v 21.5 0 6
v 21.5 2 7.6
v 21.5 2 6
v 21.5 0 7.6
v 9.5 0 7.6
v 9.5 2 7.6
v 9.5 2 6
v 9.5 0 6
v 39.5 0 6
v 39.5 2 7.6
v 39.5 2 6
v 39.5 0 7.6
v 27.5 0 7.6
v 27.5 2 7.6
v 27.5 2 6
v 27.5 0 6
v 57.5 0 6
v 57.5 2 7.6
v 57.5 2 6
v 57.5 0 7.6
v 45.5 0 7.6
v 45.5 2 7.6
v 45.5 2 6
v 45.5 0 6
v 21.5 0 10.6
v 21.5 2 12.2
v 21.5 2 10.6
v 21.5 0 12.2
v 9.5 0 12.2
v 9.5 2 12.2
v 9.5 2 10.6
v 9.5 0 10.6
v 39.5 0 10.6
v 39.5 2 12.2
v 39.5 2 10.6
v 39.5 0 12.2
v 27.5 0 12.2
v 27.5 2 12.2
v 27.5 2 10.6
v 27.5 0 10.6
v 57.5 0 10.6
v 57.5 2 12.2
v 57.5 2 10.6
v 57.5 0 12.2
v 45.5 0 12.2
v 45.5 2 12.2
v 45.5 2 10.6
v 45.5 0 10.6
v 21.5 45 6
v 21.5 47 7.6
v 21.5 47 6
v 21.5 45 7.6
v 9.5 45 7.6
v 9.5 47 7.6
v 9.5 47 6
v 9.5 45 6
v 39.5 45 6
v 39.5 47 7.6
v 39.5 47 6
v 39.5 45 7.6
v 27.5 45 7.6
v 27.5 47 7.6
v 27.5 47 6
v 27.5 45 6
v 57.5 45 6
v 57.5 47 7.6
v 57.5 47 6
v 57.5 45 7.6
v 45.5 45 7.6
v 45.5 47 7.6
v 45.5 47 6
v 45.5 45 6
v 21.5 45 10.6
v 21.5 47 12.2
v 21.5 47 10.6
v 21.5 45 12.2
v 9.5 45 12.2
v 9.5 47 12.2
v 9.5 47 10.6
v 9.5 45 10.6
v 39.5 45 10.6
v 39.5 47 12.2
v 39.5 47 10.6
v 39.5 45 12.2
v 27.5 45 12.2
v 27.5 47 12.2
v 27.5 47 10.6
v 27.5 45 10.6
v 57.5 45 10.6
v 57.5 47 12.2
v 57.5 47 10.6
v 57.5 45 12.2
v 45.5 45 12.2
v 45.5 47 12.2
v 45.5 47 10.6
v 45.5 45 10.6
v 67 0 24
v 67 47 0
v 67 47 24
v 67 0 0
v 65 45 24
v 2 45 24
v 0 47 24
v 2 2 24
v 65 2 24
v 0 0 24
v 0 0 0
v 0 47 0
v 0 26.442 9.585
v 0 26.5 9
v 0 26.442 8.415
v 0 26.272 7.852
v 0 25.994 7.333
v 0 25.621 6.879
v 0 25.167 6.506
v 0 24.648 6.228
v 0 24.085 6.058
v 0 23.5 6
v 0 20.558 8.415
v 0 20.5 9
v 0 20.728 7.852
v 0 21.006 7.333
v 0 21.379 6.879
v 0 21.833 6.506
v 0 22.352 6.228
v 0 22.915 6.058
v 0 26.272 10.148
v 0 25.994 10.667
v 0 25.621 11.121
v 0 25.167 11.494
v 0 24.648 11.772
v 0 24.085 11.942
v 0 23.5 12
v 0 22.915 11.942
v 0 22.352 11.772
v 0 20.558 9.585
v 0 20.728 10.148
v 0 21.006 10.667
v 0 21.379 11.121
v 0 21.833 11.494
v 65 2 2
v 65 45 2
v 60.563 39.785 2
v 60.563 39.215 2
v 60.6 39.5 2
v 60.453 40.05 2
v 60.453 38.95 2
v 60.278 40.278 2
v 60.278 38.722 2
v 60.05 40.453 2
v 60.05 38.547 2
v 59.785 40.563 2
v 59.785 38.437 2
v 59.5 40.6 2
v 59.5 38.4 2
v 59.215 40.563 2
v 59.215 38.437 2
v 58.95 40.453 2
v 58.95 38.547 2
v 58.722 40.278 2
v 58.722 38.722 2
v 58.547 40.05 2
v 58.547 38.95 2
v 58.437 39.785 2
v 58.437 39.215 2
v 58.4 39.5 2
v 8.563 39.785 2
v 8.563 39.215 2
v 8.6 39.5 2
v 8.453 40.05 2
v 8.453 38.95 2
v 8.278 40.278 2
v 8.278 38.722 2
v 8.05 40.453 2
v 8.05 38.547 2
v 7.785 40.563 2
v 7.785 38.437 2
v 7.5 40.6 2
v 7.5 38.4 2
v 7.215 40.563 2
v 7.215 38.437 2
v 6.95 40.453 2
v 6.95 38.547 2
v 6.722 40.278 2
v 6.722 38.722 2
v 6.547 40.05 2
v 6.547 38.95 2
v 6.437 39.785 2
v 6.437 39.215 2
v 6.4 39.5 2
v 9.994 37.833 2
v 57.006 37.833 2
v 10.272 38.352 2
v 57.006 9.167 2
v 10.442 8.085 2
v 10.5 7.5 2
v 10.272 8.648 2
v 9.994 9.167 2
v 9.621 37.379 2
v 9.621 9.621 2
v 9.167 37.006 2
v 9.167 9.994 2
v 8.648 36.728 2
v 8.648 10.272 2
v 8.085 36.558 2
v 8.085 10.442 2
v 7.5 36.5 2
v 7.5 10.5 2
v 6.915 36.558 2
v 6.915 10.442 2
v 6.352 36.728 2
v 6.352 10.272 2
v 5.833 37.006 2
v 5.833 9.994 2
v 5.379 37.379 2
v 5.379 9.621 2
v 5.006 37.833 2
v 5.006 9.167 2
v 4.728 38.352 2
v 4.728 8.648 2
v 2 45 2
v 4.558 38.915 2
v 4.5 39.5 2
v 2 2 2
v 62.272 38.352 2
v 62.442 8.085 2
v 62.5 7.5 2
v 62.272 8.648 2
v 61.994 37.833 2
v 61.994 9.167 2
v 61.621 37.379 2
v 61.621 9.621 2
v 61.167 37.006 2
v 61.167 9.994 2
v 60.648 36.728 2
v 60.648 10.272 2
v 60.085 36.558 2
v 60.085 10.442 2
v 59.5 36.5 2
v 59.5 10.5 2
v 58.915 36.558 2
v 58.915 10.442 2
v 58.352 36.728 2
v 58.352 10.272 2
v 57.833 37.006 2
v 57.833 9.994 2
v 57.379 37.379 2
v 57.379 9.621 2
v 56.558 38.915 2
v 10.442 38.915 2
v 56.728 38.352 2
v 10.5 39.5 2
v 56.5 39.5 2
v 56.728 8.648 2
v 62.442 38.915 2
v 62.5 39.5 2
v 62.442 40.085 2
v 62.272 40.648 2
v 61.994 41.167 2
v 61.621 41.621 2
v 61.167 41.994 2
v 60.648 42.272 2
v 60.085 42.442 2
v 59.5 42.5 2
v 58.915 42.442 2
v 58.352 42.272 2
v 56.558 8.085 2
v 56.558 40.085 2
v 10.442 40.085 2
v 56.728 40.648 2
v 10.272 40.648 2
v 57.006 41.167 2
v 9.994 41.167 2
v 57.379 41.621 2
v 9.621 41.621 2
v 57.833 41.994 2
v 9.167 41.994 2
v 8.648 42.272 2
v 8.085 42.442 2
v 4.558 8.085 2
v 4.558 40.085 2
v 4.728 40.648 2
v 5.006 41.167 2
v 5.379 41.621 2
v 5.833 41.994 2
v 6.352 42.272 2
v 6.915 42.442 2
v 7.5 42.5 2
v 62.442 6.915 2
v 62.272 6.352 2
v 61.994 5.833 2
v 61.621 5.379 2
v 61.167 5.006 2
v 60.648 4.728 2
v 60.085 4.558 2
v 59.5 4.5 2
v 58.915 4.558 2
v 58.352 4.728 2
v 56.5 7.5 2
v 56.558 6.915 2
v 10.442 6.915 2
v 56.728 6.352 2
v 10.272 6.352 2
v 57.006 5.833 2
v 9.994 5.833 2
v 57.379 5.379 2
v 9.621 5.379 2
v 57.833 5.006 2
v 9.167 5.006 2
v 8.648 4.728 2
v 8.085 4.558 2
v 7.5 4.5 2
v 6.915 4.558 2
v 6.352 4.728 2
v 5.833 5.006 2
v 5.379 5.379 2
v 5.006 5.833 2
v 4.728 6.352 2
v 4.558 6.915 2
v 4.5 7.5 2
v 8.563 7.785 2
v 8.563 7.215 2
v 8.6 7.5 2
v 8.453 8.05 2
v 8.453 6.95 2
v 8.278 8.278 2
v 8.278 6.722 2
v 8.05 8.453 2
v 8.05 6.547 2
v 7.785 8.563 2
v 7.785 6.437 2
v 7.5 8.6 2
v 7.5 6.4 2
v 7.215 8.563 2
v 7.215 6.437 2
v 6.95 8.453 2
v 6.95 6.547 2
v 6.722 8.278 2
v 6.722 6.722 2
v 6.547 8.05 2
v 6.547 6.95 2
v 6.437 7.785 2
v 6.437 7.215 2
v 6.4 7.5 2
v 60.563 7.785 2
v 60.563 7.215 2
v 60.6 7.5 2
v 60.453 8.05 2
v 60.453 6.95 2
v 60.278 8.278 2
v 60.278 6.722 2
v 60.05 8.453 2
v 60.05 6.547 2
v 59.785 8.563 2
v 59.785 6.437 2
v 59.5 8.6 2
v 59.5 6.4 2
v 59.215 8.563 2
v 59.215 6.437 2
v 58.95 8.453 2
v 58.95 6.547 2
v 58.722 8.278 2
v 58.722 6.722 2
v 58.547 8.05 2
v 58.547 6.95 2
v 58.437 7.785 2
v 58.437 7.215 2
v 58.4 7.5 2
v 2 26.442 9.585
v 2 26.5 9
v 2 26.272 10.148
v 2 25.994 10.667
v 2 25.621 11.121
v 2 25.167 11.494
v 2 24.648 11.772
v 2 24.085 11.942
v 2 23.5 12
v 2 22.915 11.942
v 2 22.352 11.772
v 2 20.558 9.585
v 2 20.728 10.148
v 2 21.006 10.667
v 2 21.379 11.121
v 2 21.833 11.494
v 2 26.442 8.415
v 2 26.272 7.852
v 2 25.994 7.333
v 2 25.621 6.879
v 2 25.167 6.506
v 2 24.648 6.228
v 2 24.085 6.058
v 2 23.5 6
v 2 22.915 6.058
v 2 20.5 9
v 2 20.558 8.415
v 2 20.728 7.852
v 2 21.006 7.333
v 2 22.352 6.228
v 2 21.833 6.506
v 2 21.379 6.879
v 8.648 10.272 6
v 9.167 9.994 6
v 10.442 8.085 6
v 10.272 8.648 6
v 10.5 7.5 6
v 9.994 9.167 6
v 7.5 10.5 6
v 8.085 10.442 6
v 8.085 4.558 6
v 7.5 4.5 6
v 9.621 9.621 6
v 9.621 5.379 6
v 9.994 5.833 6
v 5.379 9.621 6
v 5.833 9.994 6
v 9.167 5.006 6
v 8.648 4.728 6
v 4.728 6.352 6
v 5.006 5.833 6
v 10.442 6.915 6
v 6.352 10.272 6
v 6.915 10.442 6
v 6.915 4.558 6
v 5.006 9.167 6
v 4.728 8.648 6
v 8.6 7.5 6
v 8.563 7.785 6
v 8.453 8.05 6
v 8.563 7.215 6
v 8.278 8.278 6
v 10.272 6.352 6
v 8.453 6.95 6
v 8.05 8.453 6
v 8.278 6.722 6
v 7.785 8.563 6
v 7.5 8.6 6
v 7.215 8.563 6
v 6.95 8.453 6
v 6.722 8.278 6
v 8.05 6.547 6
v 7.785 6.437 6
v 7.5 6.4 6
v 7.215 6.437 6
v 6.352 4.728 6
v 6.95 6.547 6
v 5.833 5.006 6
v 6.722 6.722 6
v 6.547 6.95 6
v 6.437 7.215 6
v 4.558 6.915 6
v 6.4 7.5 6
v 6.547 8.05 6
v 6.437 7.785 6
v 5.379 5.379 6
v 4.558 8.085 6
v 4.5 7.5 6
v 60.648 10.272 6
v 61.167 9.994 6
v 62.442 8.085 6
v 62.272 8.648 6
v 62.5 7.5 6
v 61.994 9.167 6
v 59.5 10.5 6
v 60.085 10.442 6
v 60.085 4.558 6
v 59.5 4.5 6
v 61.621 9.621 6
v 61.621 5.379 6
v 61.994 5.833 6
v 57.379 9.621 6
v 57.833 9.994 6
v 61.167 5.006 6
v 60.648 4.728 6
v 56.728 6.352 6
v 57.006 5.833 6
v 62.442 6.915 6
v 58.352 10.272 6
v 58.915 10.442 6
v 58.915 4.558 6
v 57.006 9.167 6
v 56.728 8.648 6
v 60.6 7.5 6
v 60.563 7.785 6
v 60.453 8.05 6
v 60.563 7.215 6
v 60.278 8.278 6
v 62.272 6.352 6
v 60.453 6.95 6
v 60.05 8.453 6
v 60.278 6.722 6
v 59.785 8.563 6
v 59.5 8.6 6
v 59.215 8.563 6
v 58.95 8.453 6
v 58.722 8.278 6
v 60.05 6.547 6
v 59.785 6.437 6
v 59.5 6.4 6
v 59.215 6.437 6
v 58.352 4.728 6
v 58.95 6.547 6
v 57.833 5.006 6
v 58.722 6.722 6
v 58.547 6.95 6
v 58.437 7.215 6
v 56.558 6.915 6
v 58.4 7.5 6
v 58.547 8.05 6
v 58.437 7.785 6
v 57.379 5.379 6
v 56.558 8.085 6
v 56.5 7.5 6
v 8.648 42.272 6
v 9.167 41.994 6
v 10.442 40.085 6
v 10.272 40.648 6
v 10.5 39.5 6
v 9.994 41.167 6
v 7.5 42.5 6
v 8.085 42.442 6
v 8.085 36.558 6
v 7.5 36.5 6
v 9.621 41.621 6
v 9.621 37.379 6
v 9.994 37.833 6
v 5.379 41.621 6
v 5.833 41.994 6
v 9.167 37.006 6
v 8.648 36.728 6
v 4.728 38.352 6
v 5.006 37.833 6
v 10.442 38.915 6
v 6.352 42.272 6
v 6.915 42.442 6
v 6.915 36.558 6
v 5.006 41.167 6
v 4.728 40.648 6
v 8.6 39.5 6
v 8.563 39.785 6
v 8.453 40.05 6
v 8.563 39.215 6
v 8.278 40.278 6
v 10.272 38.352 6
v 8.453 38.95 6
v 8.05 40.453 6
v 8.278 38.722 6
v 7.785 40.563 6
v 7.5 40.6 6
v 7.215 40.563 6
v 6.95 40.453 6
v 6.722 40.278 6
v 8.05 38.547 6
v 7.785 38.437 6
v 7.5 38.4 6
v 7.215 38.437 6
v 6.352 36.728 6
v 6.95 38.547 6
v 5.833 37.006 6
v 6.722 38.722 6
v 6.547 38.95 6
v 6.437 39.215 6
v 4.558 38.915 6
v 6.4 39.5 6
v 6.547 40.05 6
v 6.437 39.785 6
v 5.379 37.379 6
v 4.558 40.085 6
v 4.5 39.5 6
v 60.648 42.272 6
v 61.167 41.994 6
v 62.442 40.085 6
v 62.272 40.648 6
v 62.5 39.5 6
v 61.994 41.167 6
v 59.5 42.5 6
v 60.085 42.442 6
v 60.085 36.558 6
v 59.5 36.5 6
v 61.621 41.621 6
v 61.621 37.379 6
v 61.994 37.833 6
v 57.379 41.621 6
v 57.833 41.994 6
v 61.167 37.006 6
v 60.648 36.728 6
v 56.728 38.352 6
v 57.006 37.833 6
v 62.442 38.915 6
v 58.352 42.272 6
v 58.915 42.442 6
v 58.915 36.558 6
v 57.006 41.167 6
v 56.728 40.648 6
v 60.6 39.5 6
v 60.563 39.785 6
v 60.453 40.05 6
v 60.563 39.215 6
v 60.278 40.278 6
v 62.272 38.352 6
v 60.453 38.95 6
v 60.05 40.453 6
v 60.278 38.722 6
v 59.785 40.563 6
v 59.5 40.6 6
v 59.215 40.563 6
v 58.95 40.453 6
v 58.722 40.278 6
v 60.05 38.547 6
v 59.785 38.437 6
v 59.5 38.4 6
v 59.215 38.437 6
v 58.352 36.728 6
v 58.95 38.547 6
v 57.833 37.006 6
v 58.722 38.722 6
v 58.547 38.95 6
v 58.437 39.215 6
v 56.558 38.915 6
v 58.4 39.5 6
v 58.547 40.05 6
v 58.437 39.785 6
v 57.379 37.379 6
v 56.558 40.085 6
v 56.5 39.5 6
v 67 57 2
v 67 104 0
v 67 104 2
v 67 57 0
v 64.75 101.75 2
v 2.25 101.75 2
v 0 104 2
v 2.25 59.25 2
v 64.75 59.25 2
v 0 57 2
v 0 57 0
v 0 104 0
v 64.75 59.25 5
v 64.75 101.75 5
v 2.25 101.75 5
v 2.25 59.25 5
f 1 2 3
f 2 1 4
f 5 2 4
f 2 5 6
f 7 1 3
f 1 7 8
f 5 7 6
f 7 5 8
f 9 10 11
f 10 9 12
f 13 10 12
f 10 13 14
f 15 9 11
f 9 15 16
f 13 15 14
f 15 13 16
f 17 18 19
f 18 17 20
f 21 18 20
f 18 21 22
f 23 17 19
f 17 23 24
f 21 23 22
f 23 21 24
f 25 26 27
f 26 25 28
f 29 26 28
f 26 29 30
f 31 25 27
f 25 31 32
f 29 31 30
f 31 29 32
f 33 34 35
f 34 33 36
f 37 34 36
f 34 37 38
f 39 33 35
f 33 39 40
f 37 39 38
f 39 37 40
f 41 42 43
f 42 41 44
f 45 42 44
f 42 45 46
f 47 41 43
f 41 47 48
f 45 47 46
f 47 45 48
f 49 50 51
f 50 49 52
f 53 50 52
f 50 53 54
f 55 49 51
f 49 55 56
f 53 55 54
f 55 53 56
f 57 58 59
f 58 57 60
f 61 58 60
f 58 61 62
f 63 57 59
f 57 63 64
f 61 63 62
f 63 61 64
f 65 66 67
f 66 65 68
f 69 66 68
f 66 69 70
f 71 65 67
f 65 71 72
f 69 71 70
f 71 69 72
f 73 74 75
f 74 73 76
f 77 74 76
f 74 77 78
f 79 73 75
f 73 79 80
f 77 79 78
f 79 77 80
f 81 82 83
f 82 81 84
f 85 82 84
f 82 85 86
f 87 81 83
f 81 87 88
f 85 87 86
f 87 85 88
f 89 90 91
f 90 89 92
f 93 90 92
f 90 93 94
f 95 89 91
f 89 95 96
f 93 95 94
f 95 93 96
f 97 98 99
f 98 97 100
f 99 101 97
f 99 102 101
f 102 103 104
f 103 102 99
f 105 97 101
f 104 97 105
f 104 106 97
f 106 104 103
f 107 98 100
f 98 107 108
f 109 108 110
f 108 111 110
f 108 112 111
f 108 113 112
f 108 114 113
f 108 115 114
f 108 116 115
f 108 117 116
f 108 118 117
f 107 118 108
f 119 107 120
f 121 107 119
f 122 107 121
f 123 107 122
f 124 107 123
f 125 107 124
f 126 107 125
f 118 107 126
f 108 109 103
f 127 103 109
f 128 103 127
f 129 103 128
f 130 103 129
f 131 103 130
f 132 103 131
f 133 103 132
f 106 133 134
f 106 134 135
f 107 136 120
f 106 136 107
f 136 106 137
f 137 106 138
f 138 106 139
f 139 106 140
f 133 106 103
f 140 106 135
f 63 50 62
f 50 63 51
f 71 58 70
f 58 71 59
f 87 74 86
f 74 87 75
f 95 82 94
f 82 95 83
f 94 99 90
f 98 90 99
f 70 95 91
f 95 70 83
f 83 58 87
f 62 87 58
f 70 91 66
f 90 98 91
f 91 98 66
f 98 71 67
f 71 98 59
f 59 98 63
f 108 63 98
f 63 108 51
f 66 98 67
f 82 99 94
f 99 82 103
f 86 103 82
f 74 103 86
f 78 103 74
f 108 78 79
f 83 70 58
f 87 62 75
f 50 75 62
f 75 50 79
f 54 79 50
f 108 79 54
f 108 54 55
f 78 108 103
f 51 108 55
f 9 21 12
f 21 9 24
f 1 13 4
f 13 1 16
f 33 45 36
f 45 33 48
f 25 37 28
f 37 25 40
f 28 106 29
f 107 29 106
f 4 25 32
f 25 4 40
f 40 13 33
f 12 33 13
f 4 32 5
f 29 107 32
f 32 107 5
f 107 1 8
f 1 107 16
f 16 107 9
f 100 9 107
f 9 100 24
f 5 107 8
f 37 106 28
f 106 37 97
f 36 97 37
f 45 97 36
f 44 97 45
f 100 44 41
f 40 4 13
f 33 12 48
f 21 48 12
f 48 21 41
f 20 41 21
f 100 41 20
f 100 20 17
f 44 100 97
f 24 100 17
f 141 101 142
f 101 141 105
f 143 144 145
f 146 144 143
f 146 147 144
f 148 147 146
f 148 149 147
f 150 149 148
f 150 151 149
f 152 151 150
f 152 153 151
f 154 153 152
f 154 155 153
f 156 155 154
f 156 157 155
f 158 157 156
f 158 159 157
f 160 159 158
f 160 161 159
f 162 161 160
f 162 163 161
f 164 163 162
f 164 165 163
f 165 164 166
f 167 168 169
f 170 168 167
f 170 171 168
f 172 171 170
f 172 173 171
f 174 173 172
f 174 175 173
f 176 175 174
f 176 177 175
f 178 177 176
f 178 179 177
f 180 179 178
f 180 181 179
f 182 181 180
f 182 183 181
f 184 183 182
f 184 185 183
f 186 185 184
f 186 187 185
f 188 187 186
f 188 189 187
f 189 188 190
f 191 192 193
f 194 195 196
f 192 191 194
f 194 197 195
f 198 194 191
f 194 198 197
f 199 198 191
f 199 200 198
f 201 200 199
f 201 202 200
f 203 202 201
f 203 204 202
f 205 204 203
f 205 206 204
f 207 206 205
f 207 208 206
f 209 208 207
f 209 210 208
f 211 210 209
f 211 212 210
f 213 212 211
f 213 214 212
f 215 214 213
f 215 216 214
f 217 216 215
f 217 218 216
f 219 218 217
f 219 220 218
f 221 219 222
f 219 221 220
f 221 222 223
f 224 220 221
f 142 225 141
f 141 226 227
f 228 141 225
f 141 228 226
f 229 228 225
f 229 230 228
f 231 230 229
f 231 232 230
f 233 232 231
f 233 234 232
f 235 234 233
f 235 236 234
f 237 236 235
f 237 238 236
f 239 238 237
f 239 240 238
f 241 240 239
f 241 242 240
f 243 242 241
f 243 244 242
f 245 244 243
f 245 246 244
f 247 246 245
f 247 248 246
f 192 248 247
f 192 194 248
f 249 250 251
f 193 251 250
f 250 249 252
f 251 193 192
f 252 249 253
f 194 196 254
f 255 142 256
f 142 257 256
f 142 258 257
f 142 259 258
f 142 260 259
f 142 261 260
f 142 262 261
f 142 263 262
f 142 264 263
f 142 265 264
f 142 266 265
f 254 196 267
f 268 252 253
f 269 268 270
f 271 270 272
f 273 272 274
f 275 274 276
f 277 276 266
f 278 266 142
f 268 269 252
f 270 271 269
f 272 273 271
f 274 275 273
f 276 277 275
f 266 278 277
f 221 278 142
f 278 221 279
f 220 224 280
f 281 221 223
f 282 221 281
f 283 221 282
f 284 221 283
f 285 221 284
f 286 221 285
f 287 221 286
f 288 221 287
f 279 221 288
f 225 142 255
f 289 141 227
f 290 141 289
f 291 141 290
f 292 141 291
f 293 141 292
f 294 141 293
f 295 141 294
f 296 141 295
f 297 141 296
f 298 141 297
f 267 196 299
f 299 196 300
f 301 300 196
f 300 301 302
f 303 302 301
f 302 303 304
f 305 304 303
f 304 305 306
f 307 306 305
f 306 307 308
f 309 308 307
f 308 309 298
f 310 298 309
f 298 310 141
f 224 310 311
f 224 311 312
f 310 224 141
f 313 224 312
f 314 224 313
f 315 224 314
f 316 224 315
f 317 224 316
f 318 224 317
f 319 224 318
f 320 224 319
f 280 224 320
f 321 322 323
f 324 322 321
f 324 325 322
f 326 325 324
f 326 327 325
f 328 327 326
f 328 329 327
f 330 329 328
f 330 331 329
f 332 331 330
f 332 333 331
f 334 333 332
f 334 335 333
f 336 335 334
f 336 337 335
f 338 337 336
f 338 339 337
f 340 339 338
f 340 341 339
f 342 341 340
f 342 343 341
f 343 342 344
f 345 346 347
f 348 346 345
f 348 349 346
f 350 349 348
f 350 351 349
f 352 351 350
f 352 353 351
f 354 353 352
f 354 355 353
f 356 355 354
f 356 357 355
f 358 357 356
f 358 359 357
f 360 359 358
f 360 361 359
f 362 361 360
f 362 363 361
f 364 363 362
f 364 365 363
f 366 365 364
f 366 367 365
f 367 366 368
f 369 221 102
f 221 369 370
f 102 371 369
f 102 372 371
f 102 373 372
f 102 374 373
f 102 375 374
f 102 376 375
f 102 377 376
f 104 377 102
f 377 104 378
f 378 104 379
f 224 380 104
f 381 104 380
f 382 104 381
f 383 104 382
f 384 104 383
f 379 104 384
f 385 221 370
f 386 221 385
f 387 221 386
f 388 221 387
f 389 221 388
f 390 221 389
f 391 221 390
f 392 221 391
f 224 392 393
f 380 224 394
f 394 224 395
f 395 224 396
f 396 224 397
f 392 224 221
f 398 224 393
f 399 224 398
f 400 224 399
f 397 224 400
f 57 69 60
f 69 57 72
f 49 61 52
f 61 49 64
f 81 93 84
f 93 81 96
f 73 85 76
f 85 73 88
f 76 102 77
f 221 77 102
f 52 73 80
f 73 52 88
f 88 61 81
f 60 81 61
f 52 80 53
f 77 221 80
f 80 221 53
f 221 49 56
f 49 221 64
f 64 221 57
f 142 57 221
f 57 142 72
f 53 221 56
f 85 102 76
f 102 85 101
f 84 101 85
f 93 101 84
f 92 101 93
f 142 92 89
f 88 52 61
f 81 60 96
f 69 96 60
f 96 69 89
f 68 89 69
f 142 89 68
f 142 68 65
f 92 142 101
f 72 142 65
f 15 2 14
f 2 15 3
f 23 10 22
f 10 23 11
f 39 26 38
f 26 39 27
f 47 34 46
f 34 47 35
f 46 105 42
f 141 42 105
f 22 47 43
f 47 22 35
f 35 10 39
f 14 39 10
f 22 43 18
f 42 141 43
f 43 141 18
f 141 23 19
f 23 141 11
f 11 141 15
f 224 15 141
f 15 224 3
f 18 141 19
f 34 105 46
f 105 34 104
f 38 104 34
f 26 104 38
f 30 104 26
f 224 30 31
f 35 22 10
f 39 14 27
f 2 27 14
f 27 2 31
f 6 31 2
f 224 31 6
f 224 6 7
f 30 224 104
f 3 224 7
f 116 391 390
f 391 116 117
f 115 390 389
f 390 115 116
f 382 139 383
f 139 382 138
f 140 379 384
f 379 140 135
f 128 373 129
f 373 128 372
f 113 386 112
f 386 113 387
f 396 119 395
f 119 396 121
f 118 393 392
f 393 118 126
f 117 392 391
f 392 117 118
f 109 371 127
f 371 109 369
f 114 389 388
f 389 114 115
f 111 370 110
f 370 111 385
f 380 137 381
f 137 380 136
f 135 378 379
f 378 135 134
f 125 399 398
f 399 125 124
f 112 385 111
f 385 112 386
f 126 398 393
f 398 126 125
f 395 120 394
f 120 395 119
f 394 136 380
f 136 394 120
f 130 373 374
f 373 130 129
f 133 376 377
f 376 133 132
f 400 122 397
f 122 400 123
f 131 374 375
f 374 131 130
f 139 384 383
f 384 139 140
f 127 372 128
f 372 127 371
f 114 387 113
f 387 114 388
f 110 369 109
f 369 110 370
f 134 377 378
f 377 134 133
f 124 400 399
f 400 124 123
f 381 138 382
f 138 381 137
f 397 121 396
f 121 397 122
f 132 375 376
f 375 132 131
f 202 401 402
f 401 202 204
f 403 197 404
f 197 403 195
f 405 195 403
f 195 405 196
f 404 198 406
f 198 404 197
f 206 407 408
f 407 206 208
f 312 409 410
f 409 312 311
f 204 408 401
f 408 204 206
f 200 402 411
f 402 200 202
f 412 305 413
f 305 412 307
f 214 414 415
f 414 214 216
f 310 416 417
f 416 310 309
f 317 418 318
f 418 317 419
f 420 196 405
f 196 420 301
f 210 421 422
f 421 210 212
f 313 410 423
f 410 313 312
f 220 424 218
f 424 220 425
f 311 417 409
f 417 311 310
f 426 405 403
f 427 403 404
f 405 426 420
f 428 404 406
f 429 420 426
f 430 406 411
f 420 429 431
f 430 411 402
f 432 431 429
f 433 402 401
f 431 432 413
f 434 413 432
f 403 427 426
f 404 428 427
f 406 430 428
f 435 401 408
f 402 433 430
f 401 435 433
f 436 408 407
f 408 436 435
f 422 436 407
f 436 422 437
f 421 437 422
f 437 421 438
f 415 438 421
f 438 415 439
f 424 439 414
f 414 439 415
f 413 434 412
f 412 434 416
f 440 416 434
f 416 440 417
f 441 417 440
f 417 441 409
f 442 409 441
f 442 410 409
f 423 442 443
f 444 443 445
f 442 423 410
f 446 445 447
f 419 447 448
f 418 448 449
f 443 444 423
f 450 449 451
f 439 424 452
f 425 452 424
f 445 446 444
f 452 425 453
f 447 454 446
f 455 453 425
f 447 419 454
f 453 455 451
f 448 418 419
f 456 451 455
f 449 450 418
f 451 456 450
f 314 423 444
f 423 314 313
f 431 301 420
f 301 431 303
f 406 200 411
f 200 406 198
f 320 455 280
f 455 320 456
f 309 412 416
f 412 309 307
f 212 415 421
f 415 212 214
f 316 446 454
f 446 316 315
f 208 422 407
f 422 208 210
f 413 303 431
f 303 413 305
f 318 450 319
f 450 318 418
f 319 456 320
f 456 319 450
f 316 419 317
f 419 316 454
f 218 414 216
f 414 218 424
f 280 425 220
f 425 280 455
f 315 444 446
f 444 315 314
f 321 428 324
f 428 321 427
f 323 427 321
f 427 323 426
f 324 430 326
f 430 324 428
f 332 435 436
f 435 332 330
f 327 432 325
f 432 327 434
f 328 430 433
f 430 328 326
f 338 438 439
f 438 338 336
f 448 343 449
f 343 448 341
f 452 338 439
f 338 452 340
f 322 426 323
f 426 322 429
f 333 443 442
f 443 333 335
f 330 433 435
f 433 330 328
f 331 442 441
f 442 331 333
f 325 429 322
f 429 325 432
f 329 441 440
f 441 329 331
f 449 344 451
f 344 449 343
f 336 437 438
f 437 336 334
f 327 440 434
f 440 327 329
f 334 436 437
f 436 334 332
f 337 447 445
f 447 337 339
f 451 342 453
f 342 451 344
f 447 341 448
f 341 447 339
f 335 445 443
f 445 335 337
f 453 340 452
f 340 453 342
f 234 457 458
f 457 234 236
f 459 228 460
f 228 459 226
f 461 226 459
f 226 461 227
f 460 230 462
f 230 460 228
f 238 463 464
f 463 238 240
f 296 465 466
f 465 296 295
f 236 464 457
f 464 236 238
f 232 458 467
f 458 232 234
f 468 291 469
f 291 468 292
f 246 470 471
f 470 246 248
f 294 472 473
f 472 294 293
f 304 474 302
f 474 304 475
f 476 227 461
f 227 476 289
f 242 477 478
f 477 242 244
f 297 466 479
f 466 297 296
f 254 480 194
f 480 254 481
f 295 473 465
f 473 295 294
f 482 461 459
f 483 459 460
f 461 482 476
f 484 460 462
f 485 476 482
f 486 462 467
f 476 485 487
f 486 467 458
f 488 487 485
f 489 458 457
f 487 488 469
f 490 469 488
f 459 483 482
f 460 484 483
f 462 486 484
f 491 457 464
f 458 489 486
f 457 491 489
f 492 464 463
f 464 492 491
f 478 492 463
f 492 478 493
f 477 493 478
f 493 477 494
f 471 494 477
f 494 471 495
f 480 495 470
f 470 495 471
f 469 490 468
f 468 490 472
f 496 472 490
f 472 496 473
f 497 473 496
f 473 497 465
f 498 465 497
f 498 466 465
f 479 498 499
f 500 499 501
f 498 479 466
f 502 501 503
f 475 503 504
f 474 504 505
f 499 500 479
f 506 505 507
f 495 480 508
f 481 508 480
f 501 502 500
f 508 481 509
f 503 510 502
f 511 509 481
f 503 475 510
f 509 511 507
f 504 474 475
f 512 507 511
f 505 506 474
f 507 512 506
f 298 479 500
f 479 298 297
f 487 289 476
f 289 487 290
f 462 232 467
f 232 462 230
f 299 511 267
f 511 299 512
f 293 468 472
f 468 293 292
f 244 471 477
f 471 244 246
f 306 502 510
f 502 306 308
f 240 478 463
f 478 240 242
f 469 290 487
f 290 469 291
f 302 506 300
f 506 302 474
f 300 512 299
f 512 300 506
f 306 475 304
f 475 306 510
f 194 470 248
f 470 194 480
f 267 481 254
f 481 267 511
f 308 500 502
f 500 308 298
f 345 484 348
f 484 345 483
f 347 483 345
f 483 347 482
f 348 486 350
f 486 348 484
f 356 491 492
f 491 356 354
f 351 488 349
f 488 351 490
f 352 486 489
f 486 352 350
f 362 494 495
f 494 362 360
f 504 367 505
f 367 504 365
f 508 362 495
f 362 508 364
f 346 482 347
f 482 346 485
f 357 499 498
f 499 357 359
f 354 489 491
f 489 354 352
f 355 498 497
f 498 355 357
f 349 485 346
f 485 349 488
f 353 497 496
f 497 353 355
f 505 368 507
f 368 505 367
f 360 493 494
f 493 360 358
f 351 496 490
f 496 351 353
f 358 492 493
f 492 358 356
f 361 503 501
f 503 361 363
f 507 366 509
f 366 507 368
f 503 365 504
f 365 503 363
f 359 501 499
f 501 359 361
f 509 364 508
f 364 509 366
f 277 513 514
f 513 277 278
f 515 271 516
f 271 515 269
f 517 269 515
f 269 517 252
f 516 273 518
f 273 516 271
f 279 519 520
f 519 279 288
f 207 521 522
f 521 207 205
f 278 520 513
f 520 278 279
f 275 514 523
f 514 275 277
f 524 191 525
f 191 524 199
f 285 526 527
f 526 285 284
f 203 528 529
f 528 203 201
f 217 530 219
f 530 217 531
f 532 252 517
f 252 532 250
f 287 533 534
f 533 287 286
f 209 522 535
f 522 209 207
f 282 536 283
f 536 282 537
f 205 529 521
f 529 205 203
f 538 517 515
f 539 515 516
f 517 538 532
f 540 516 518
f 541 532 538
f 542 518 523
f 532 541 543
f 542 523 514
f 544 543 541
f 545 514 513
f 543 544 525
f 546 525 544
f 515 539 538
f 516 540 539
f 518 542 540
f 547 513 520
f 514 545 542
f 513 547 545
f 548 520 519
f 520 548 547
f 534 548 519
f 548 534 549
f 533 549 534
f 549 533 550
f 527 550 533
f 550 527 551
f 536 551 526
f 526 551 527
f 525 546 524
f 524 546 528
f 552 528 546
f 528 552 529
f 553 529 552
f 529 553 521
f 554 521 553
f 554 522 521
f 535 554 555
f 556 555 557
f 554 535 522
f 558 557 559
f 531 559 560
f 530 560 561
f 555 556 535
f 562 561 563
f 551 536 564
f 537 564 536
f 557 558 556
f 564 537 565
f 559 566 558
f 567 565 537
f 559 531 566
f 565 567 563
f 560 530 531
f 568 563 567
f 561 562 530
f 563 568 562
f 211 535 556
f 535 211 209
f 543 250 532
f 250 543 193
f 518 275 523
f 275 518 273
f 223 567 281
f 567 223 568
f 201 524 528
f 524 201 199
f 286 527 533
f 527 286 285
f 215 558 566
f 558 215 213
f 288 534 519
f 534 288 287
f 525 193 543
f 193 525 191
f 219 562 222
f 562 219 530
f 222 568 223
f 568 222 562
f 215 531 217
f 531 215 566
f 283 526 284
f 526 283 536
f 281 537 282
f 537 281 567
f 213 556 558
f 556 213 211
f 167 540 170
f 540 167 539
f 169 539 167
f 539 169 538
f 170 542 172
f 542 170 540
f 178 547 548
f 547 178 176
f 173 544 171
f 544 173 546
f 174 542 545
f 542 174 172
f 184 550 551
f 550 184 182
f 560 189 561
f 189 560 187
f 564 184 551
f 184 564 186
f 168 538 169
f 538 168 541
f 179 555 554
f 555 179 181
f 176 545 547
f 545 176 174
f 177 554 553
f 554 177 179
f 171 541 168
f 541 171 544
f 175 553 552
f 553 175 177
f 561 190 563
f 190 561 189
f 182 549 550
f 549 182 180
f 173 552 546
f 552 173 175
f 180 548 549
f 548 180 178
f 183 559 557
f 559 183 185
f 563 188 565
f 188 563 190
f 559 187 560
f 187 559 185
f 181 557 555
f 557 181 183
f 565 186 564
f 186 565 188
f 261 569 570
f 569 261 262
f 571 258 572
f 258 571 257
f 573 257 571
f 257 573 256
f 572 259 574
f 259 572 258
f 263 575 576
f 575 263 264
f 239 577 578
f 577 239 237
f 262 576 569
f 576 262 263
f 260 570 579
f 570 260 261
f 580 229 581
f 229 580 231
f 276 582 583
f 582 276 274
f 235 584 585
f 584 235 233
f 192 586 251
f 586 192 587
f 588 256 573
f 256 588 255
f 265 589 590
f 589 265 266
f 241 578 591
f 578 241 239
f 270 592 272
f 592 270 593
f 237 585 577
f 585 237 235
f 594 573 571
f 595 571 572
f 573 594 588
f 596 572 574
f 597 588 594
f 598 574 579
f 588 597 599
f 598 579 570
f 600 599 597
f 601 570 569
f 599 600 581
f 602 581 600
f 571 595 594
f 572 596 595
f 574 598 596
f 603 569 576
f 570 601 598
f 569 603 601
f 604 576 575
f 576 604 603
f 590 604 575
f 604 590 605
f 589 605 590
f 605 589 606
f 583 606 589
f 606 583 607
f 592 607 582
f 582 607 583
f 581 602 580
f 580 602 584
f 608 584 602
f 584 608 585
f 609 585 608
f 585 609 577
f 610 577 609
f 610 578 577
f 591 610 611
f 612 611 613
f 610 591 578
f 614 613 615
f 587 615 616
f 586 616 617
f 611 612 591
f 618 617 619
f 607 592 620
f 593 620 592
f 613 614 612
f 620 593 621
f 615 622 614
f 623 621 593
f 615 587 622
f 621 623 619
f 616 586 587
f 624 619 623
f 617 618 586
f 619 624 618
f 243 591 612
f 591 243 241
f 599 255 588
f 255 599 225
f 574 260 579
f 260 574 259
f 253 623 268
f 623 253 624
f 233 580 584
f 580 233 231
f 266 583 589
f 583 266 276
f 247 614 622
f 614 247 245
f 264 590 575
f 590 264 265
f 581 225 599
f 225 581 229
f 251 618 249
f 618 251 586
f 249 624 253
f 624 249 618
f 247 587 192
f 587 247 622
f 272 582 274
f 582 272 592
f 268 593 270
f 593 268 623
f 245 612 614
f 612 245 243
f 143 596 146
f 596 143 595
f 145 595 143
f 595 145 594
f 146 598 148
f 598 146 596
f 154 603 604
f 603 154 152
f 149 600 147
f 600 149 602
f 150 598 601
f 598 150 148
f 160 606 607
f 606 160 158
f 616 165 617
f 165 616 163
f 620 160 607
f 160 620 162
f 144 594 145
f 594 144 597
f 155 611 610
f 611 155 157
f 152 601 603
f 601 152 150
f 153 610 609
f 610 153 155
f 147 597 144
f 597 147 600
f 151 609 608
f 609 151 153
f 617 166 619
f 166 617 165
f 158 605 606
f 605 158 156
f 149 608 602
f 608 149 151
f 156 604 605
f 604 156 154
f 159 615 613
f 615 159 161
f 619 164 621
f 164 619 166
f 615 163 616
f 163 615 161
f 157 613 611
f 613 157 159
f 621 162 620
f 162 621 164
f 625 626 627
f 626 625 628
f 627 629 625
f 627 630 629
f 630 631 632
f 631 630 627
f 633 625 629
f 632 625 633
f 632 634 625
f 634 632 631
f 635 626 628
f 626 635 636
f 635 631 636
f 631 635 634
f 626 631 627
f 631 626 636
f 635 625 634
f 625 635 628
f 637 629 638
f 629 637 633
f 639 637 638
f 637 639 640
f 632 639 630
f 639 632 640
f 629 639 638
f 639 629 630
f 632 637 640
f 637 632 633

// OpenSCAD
// Aurora parametric enclosure template
// Generated by aurora@aurora-smart-home (esphome skill)
// https://github.com/tonylofgren/aurora-smart-home
//
// Copy to <project>/hardware/ENCLOSURE.scad and set the parameter block.
// Renders a two-part snap-lid box: base with PCB standoffs, friction-fit lid.
// Units: mm.

/* ===================== Parameters ===================== */

// PCB outline (from PCB-NOTES.md board outline section)
board_l = 60;            // PCB length
board_w = 40;            // PCB width
board_clearance = 1.5;   // air gap around the PCB on all sides

// Shell
wall = 2.0;              // vertical wall thickness
floor_h = 2.0;           // base floor thickness
lid_h = 2.0;             // lid plate thickness
inner_h = 22;            // interior height above the floor

// PCB standoffs (M2.5 self-tap pilot by default)
standoff_h = 4;          // standoff height
standoff_d = 6;          // standoff outer diameter
pilot_d = 2.2;           // pilot hole for M2.5 self-tapping screw
hole_inset = 4;          // standoff center inset from PCB corners

// Openings
cable_d = 6;             // cable opening diameter in one short wall, 0 = none
vent_rows = 2;           // ventilation slot rows per long wall, 0 = sealed
vent_slot_l = 12;        // slot length
vent_slot_w = 1.6;       // slot width (FDM-printable without supports)
sensor_window_w = 0;     // rectangular lid opening width, 0 = none
sensor_window_l = 0;     // rectangular lid opening length

// Lid fit
lid_tolerance = 0.25;    // friction-fit clearance per side; tune per printer

/* ===================== Derived ===================== */

inner_l = board_l + 2 * board_clearance;
inner_w = board_w + 2 * board_clearance;
outer_l = inner_l + 2 * wall;
outer_w = inner_w + 2 * wall;
outer_h = floor_h + inner_h;

/* ===================== Base ===================== */

module standoff(x, y) {
    translate([x, y, floor_h])
        difference() {
            cylinder(h = standoff_h, d = standoff_d, $fn = 32);
            cylinder(h = standoff_h + 1, d = pilot_d, $fn = 24);
        }
}

module vents() {
    if (vent_rows > 0)
        for (side = [0, 1])
            for (row = [0 : vent_rows - 1])
                for (i = [0 : 2])
                    translate([
                        outer_l / 2 - 1.5 * vent_slot_l + i * 1.5 * vent_slot_l - vent_slot_l / 2,
                        side == 0 ? -1 : outer_w - wall - 1,
                        floor_h + 4 + row * (vent_slot_w + 3)
                    ])
                        cube([vent_slot_l, wall + 2, vent_slot_w]);
}

module cable_opening() {
    if (cable_d > 0)
        translate([-1, outer_w / 2, floor_h + standoff_h + cable_d / 2])
            rotate([0, 90, 0])
                cylinder(h = wall + 2, d = cable_d, $fn = 32);
}

module base() {
    difference() {
        cube([outer_l, outer_w, outer_h]);
        translate([wall, wall, floor_h])
            cube([inner_l, inner_w, inner_h + 1]);
        vents();
        cable_opening();
    }
    standoff(wall + board_clearance + hole_inset, wall + board_clearance + hole_inset);
    standoff(outer_l - wall - board_clearance - hole_inset, wall + board_clearance + hole_inset);
    standoff(wall + board_clearance + hole_inset, outer_w - wall - board_clearance - hole_inset);
    standoff(outer_l - wall - board_clearance - hole_inset, outer_w - wall - board_clearance - hole_inset);
}

/* ===================== Lid ===================== */

module lid() {
    translate([0, outer_w + 10, 0]) {
        difference() {
            union() {
                cube([outer_l, outer_w, lid_h]);
                translate([wall + lid_tolerance, wall + lid_tolerance, lid_h])
                    cube([
                        inner_l - 2 * lid_tolerance,
                        inner_w - 2 * lid_tolerance,
                        3
                    ]);
            }
            if (sensor_window_w > 0 && sensor_window_l > 0)
                translate([
                    (outer_l - sensor_window_l) / 2,
                    (outer_w - sensor_window_w) / 2,
                    -1
                ])
                    cube([sensor_window_l, sensor_window_w, lid_h + 5]);
        }
    }
}

/* ===================== Render ===================== */

base();
lid();

/* ===================== Print settings =====================
   Material: PETG for indoor, ASA for outdoor (UV).
   Layer height 0.2 mm, 3 perimeters, 20% infill.
   No supports needed; lid prints upside down as oriented.
   Outdoor/wet placement: set vent_rows = 0 and verify sealing
   per the project's HAZARD-ANALYSIS.md.
============================================================ */
